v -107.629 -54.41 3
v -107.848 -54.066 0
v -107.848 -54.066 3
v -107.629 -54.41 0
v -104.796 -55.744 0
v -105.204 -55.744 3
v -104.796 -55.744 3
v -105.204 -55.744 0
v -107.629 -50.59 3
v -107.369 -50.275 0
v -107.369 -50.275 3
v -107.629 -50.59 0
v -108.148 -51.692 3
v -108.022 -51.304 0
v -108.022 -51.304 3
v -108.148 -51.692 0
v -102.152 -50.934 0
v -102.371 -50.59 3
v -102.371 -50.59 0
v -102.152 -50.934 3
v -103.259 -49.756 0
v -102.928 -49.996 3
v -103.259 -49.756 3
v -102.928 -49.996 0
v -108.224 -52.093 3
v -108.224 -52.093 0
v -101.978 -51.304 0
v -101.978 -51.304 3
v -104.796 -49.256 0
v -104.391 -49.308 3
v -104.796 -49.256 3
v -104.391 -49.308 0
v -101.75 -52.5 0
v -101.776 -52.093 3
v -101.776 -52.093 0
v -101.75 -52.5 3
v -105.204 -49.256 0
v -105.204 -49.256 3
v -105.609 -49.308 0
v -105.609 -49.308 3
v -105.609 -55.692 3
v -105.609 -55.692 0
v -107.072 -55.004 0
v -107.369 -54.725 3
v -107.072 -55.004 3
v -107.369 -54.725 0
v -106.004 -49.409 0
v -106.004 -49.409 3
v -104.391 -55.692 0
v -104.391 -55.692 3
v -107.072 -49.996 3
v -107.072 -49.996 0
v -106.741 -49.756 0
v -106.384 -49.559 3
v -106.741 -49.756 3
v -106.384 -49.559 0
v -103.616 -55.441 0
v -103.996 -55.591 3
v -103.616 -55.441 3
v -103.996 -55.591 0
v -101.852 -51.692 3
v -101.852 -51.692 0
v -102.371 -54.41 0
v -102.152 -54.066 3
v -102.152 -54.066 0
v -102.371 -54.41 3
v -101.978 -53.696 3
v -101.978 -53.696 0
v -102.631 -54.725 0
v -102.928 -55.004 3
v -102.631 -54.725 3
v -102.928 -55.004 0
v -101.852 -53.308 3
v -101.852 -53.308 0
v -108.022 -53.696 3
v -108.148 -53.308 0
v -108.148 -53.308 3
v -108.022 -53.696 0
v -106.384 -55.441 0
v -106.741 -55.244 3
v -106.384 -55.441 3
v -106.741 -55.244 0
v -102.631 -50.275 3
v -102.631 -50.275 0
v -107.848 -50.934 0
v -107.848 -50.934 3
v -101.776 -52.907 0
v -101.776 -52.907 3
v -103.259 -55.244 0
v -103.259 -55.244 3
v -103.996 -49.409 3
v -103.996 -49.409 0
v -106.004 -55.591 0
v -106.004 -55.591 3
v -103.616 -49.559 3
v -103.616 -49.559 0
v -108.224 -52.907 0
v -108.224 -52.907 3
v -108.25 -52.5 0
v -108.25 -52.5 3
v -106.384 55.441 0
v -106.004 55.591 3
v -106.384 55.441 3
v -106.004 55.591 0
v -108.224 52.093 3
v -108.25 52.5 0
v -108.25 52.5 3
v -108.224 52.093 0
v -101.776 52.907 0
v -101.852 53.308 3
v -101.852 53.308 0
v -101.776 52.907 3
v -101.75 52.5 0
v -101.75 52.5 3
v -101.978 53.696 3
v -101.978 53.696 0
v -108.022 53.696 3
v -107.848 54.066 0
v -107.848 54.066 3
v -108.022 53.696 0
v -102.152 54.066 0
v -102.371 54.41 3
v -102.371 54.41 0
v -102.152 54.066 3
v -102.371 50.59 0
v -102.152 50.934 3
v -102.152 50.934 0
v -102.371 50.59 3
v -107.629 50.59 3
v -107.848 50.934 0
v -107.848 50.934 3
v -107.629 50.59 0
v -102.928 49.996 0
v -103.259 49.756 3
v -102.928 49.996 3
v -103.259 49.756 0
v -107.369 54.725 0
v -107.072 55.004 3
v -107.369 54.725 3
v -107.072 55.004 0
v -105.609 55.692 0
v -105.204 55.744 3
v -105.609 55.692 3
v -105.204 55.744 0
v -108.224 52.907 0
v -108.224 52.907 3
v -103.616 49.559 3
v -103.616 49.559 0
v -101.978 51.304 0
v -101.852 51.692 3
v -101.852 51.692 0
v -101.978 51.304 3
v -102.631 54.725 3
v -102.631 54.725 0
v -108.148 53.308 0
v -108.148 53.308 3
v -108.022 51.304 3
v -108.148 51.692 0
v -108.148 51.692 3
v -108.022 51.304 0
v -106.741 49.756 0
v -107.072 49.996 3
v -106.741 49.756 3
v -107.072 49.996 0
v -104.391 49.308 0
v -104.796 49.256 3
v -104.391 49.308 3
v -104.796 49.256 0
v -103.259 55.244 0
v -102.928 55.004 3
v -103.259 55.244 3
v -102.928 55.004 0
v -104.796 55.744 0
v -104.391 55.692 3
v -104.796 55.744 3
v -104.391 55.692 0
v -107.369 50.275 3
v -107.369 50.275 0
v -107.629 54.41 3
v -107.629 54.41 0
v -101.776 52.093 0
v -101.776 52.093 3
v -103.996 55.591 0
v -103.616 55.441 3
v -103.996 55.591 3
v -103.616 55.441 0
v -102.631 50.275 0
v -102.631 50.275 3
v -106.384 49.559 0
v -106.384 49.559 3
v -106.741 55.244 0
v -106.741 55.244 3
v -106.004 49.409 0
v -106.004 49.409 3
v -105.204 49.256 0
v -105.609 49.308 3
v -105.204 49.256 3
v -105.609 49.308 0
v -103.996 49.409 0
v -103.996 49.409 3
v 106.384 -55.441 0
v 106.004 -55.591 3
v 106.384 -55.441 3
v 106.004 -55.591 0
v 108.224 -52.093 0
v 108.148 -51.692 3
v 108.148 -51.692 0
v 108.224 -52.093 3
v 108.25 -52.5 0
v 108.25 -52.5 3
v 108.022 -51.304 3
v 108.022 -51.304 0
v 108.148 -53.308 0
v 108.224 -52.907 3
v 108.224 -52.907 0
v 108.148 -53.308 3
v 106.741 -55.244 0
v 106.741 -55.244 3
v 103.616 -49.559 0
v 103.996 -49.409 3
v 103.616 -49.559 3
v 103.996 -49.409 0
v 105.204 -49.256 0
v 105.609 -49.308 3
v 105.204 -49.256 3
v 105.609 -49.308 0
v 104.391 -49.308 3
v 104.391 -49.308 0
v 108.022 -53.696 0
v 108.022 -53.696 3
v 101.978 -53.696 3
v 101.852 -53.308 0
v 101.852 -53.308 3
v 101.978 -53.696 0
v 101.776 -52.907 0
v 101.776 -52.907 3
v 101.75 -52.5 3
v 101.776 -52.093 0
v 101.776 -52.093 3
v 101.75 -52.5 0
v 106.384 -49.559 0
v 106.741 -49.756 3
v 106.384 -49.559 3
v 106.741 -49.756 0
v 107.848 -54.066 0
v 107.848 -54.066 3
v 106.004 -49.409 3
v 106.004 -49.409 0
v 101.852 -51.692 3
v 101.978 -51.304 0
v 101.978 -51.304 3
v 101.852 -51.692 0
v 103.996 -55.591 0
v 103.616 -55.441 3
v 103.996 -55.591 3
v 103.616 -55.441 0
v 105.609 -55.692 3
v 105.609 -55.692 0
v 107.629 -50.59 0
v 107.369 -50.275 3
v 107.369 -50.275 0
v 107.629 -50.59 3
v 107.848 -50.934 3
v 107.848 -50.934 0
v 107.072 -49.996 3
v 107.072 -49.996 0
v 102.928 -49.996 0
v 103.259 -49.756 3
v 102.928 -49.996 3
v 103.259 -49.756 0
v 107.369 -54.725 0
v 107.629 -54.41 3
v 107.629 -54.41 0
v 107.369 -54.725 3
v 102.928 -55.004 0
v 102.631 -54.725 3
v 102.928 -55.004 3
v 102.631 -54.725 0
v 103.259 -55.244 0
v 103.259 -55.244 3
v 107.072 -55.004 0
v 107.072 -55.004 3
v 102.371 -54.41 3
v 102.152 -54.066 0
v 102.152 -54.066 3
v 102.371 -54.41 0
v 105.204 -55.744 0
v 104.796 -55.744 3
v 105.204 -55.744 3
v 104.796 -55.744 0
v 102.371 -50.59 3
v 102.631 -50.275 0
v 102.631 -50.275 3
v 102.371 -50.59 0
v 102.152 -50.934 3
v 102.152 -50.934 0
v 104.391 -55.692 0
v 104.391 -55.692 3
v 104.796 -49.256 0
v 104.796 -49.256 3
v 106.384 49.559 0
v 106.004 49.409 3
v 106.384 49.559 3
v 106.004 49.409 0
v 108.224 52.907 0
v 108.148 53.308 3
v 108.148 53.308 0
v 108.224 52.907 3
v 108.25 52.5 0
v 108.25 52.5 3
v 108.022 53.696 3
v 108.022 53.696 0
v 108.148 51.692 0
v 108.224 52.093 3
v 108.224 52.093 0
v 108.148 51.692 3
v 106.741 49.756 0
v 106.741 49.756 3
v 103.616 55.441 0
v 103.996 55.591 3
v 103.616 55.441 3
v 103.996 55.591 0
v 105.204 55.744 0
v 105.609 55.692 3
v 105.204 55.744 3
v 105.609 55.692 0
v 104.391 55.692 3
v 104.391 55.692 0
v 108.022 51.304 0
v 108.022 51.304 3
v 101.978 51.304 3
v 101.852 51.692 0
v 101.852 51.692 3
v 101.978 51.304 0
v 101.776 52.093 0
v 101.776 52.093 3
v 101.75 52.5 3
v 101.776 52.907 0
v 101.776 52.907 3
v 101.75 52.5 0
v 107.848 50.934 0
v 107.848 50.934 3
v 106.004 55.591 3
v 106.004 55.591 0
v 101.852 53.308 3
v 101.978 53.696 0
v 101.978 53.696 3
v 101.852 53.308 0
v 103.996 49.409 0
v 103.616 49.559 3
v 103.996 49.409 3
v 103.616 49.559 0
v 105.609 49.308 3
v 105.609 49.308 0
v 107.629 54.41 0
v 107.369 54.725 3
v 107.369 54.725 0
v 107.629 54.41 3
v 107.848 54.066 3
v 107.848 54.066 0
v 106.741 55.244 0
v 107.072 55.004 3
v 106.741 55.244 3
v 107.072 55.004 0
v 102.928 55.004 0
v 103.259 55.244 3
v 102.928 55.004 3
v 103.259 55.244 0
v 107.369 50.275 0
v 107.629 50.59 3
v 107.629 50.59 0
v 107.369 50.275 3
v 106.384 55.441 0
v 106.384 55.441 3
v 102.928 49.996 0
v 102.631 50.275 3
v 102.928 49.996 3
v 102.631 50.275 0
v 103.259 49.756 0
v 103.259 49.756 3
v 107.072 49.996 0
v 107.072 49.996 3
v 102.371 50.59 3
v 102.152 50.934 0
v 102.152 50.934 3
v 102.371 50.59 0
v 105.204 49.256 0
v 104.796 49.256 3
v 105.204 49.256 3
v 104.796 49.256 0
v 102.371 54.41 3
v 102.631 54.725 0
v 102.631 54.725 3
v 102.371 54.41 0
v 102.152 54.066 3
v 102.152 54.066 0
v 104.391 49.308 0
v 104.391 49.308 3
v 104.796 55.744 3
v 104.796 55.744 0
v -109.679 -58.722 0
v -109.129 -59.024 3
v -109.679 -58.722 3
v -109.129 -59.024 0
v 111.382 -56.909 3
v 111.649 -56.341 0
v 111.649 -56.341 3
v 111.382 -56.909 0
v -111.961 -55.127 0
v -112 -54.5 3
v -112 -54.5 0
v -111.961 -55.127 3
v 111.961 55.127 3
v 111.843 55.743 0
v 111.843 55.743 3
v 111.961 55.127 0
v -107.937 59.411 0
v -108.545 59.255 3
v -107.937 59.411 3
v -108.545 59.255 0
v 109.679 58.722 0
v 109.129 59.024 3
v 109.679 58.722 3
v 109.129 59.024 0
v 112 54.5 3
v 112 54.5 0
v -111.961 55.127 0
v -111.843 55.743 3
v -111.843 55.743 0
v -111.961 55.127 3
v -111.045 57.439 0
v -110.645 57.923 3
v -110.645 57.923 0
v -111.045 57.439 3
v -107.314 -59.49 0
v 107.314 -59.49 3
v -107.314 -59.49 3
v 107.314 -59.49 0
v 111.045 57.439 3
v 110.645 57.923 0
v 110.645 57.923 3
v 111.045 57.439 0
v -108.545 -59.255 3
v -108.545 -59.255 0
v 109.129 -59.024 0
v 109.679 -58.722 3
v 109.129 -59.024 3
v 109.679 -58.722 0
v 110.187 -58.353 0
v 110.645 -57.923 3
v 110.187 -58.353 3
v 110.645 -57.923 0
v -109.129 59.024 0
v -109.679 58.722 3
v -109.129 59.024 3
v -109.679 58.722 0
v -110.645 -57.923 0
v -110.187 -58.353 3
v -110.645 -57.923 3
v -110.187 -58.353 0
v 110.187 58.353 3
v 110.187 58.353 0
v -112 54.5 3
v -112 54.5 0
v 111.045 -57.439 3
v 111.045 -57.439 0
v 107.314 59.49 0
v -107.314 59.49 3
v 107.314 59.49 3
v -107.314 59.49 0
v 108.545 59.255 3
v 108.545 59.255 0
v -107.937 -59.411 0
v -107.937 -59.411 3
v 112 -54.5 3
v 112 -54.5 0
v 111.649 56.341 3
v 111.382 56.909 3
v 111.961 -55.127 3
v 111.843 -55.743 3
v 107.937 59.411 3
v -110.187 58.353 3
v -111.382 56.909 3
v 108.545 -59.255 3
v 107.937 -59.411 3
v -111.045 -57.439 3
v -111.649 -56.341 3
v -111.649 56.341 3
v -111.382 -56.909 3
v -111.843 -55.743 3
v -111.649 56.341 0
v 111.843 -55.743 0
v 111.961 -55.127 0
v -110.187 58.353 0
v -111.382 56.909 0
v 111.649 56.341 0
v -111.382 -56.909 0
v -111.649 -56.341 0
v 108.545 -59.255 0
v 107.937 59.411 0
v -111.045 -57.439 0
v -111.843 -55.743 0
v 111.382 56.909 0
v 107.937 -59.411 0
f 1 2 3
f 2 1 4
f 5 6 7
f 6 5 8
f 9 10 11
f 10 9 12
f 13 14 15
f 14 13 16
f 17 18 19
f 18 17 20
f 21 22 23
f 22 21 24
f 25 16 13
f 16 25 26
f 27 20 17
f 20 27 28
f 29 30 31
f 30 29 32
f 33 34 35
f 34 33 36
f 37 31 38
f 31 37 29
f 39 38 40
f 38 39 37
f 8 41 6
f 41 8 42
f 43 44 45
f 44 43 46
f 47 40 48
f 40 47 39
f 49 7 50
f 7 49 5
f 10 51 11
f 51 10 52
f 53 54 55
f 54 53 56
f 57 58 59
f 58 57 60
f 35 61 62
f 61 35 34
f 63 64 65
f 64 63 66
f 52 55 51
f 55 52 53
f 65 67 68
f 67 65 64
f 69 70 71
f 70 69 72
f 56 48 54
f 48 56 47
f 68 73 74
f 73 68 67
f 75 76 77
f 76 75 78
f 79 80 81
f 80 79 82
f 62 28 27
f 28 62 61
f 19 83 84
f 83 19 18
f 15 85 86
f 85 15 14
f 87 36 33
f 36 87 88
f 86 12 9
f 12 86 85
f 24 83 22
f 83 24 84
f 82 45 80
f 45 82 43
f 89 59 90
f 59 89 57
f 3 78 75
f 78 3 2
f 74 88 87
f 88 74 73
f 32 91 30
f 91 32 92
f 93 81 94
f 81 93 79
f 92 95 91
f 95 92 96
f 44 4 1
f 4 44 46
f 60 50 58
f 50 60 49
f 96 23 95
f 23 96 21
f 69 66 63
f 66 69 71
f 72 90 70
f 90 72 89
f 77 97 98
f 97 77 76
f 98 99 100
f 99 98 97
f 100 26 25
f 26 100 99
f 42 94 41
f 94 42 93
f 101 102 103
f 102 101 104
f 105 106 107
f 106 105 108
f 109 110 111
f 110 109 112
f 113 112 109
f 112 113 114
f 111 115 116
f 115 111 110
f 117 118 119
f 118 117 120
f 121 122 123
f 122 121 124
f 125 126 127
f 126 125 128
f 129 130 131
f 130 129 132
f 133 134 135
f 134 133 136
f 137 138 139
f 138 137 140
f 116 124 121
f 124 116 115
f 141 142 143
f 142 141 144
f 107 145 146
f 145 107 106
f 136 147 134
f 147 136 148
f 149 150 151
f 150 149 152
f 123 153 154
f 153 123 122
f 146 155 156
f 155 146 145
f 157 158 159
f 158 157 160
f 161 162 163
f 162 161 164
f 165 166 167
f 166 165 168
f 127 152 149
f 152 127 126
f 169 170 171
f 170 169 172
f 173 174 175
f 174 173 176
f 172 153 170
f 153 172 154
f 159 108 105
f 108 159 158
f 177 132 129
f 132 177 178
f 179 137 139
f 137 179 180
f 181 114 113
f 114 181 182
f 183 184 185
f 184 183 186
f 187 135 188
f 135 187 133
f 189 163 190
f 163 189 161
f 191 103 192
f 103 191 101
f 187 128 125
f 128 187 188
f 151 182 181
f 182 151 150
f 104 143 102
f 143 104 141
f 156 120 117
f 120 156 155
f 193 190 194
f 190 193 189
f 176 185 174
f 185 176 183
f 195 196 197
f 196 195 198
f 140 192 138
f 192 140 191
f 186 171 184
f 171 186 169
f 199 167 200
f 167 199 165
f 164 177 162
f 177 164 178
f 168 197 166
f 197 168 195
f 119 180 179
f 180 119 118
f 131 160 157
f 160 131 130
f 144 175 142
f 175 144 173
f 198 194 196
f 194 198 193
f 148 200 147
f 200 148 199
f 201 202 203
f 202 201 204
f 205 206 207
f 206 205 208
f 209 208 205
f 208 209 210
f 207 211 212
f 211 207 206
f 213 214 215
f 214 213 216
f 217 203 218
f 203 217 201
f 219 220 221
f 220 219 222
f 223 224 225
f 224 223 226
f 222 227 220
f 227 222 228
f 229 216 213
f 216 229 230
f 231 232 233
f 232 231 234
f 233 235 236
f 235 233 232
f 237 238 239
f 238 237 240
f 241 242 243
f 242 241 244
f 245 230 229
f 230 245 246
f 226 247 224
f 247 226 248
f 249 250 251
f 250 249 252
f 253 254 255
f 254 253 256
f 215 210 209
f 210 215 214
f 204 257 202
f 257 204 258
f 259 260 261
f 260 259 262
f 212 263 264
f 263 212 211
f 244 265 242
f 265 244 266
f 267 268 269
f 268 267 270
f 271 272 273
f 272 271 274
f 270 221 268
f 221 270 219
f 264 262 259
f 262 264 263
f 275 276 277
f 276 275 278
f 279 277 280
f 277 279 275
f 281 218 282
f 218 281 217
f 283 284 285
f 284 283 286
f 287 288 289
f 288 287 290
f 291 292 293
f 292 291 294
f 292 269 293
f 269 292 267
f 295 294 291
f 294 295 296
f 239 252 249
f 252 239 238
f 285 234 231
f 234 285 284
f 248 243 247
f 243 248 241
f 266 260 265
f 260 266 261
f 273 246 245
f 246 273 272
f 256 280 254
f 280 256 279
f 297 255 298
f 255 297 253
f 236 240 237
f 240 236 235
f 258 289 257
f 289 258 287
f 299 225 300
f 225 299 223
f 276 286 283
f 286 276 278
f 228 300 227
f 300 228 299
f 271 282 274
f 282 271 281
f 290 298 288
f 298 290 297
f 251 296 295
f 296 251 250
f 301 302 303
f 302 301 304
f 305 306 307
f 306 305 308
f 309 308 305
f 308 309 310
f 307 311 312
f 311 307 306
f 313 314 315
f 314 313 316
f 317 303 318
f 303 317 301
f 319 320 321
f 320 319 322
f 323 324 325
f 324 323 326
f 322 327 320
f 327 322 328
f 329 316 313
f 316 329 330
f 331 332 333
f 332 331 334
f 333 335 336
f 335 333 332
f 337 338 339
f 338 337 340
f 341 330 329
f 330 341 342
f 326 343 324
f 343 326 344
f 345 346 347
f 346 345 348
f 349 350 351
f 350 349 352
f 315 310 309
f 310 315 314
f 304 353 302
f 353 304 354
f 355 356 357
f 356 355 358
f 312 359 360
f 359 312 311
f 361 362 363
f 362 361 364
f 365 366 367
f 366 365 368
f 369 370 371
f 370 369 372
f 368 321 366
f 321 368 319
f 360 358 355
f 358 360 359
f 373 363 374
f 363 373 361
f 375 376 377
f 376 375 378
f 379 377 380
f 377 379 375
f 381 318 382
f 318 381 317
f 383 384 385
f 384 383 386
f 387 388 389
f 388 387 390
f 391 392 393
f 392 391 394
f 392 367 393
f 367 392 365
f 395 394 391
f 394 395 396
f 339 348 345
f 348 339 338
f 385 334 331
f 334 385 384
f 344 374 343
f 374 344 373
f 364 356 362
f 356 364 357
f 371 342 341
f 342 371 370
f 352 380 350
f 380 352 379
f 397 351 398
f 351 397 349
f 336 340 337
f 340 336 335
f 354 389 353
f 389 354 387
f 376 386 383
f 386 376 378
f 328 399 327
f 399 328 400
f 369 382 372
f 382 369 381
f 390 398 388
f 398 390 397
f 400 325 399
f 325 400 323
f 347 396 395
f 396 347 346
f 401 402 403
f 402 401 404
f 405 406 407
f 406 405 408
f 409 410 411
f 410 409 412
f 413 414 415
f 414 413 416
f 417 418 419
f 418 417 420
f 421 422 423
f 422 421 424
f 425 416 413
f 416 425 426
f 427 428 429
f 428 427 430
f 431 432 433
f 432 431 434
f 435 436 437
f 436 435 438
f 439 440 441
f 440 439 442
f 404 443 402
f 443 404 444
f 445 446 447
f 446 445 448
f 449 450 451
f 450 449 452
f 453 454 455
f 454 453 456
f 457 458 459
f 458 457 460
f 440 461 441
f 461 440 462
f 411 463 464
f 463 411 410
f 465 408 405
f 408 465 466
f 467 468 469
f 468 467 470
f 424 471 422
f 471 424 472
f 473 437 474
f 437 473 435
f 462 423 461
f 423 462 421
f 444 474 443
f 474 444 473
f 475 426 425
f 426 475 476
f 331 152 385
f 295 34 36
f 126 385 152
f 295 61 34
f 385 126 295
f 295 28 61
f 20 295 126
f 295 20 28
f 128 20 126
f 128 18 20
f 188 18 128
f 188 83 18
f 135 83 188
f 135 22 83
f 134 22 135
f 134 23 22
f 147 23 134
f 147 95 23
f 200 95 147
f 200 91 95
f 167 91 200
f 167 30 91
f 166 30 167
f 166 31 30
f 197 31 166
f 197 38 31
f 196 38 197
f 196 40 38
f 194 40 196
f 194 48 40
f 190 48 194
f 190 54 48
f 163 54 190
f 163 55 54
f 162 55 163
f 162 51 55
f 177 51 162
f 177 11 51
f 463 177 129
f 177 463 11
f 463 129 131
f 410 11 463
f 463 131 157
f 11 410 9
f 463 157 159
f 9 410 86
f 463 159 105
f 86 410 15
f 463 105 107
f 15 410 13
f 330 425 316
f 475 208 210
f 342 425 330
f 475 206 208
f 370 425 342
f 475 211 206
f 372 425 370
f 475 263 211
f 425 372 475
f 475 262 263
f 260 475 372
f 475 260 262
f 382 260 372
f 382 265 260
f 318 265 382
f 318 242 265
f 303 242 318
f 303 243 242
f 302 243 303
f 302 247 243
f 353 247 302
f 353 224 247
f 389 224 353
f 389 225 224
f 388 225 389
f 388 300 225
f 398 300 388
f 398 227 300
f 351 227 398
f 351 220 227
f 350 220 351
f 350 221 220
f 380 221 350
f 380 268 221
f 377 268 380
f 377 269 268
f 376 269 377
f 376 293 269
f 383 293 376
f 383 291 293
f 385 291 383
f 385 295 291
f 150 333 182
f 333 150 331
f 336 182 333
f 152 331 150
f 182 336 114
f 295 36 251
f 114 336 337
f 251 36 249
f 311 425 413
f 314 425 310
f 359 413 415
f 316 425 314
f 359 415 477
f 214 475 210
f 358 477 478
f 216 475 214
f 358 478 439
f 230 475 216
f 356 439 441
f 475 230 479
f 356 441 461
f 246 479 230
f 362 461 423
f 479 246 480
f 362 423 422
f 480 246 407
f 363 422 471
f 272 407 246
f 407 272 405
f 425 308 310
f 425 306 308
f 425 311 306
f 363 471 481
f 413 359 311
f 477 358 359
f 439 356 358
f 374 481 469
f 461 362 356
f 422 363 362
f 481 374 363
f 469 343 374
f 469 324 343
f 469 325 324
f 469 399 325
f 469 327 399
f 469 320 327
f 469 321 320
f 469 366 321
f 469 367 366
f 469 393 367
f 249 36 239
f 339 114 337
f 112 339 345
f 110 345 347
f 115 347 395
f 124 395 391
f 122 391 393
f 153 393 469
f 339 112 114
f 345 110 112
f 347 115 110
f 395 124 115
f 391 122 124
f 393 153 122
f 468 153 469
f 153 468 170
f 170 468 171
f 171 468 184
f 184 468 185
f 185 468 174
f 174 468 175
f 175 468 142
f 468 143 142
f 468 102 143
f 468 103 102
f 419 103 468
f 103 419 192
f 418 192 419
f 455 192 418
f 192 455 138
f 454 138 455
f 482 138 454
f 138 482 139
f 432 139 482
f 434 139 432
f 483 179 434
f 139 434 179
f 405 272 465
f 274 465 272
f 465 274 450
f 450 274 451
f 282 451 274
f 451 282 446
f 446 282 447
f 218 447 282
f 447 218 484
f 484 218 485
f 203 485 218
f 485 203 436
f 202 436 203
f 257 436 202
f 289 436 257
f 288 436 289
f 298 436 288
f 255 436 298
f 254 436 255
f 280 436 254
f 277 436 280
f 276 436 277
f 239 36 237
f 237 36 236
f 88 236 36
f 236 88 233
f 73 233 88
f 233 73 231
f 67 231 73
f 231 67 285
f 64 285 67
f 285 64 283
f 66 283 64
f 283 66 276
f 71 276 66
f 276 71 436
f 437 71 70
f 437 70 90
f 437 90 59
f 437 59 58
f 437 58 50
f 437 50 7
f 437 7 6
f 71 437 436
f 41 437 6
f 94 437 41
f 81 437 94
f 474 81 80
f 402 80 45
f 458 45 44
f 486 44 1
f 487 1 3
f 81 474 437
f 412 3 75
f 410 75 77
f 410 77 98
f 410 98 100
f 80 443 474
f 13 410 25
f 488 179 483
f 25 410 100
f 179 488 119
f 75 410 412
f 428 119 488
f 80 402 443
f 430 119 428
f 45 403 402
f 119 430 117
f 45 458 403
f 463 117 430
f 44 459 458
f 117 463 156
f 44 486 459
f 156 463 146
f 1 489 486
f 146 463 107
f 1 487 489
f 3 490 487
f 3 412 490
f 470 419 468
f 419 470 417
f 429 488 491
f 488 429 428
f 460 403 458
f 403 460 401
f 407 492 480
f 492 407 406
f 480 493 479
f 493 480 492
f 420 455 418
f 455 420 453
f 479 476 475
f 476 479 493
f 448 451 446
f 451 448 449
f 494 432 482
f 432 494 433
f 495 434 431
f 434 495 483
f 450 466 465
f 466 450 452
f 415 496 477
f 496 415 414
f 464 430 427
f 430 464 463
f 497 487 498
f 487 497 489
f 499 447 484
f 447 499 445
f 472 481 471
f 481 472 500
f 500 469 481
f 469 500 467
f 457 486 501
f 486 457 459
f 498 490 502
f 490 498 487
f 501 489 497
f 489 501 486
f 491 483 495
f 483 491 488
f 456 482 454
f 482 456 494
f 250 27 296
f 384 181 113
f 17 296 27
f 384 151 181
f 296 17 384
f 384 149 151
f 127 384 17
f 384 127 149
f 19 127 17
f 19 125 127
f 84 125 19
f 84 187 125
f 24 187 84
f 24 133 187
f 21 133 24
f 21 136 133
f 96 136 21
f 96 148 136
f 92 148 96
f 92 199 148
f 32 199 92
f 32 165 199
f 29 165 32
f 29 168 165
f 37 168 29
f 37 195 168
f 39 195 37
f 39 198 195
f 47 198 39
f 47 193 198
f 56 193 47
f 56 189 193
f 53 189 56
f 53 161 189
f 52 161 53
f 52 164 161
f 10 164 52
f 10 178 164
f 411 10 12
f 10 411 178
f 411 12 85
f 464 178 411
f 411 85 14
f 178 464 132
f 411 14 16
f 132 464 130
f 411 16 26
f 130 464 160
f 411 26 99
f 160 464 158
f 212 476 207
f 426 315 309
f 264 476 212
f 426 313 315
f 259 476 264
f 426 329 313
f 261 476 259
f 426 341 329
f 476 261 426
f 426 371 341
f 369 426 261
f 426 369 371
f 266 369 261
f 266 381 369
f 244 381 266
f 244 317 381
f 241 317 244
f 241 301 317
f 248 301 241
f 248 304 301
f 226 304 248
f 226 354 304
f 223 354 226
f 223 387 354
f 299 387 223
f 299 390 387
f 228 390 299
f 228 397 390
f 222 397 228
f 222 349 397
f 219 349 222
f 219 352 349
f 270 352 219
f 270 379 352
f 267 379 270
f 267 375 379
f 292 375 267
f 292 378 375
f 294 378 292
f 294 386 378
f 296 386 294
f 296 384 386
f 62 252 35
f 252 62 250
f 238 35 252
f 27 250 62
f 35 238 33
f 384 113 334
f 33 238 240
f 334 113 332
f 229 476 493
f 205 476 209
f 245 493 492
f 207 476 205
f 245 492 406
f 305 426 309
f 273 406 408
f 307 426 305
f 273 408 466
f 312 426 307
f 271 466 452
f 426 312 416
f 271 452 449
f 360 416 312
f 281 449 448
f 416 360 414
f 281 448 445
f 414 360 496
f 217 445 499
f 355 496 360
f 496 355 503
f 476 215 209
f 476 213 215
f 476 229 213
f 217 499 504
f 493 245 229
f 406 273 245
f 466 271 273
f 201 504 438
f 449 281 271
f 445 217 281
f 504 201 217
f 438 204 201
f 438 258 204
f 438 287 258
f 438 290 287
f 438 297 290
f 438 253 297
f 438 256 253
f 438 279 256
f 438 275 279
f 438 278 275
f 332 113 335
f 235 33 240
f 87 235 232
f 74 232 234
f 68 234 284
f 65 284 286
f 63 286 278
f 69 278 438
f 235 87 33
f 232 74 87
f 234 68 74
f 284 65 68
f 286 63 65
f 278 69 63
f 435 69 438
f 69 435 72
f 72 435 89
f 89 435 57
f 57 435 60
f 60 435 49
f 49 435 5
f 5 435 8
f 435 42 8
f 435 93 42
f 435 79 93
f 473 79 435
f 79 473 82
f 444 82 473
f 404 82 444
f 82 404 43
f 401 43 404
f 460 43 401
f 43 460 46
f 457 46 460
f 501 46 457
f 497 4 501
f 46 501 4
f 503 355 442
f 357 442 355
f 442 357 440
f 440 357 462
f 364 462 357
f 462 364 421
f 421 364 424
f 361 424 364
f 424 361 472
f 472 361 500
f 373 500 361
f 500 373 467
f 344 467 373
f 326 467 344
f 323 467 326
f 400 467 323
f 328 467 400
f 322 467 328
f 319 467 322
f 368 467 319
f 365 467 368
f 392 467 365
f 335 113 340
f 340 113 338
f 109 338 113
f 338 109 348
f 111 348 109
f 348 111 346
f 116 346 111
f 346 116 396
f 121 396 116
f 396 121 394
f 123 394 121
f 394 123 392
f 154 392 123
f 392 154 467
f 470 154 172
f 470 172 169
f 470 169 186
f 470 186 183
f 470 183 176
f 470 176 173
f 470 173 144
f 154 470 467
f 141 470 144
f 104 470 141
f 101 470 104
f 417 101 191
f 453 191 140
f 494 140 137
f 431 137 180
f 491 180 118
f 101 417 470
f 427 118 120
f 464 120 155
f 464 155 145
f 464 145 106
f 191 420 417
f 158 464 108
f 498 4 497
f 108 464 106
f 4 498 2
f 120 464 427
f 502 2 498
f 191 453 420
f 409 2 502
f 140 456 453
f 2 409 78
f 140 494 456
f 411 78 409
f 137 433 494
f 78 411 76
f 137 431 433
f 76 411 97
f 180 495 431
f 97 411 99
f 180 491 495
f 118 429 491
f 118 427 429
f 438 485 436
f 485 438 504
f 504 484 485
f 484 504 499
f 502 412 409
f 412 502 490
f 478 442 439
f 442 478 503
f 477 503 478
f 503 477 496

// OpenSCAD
$fn = 50;


difference() {
	union() {
		hull() {
			translate(v = [-107.0000000000, 54.5000000000, 0]) {
				cylinder(h = 3, r = 5);
			}
			translate(v = [107.0000000000, 54.5000000000, 0]) {
				cylinder(h = 3, r = 5);
			}
			translate(v = [-107.0000000000, -54.5000000000, 0]) {
				cylinder(h = 3, r = 5);
			}
			translate(v = [107.0000000000, -54.5000000000, 0]) {
				cylinder(h = 3, r = 5);
			}
		}
	}
	union() {
		translate(v = [-105.0000000000, -52.5000000000, -100.0000000000]) {
			cylinder(h = 200, r = 3.2500000000);
		}
		translate(v = [-105.0000000000, 52.5000000000, -100.0000000000]) {
			cylinder(h = 200, r = 3.2500000000);
		}
		translate(v = [105.0000000000, -52.5000000000, -100.0000000000]) {
			cylinder(h = 200, r = 3.2500000000);
		}
		translate(v = [105.0000000000, 52.5000000000, -100.0000000000]) {
			cylinder(h = 200, r = 3.2500000000);
		}
	}
}
